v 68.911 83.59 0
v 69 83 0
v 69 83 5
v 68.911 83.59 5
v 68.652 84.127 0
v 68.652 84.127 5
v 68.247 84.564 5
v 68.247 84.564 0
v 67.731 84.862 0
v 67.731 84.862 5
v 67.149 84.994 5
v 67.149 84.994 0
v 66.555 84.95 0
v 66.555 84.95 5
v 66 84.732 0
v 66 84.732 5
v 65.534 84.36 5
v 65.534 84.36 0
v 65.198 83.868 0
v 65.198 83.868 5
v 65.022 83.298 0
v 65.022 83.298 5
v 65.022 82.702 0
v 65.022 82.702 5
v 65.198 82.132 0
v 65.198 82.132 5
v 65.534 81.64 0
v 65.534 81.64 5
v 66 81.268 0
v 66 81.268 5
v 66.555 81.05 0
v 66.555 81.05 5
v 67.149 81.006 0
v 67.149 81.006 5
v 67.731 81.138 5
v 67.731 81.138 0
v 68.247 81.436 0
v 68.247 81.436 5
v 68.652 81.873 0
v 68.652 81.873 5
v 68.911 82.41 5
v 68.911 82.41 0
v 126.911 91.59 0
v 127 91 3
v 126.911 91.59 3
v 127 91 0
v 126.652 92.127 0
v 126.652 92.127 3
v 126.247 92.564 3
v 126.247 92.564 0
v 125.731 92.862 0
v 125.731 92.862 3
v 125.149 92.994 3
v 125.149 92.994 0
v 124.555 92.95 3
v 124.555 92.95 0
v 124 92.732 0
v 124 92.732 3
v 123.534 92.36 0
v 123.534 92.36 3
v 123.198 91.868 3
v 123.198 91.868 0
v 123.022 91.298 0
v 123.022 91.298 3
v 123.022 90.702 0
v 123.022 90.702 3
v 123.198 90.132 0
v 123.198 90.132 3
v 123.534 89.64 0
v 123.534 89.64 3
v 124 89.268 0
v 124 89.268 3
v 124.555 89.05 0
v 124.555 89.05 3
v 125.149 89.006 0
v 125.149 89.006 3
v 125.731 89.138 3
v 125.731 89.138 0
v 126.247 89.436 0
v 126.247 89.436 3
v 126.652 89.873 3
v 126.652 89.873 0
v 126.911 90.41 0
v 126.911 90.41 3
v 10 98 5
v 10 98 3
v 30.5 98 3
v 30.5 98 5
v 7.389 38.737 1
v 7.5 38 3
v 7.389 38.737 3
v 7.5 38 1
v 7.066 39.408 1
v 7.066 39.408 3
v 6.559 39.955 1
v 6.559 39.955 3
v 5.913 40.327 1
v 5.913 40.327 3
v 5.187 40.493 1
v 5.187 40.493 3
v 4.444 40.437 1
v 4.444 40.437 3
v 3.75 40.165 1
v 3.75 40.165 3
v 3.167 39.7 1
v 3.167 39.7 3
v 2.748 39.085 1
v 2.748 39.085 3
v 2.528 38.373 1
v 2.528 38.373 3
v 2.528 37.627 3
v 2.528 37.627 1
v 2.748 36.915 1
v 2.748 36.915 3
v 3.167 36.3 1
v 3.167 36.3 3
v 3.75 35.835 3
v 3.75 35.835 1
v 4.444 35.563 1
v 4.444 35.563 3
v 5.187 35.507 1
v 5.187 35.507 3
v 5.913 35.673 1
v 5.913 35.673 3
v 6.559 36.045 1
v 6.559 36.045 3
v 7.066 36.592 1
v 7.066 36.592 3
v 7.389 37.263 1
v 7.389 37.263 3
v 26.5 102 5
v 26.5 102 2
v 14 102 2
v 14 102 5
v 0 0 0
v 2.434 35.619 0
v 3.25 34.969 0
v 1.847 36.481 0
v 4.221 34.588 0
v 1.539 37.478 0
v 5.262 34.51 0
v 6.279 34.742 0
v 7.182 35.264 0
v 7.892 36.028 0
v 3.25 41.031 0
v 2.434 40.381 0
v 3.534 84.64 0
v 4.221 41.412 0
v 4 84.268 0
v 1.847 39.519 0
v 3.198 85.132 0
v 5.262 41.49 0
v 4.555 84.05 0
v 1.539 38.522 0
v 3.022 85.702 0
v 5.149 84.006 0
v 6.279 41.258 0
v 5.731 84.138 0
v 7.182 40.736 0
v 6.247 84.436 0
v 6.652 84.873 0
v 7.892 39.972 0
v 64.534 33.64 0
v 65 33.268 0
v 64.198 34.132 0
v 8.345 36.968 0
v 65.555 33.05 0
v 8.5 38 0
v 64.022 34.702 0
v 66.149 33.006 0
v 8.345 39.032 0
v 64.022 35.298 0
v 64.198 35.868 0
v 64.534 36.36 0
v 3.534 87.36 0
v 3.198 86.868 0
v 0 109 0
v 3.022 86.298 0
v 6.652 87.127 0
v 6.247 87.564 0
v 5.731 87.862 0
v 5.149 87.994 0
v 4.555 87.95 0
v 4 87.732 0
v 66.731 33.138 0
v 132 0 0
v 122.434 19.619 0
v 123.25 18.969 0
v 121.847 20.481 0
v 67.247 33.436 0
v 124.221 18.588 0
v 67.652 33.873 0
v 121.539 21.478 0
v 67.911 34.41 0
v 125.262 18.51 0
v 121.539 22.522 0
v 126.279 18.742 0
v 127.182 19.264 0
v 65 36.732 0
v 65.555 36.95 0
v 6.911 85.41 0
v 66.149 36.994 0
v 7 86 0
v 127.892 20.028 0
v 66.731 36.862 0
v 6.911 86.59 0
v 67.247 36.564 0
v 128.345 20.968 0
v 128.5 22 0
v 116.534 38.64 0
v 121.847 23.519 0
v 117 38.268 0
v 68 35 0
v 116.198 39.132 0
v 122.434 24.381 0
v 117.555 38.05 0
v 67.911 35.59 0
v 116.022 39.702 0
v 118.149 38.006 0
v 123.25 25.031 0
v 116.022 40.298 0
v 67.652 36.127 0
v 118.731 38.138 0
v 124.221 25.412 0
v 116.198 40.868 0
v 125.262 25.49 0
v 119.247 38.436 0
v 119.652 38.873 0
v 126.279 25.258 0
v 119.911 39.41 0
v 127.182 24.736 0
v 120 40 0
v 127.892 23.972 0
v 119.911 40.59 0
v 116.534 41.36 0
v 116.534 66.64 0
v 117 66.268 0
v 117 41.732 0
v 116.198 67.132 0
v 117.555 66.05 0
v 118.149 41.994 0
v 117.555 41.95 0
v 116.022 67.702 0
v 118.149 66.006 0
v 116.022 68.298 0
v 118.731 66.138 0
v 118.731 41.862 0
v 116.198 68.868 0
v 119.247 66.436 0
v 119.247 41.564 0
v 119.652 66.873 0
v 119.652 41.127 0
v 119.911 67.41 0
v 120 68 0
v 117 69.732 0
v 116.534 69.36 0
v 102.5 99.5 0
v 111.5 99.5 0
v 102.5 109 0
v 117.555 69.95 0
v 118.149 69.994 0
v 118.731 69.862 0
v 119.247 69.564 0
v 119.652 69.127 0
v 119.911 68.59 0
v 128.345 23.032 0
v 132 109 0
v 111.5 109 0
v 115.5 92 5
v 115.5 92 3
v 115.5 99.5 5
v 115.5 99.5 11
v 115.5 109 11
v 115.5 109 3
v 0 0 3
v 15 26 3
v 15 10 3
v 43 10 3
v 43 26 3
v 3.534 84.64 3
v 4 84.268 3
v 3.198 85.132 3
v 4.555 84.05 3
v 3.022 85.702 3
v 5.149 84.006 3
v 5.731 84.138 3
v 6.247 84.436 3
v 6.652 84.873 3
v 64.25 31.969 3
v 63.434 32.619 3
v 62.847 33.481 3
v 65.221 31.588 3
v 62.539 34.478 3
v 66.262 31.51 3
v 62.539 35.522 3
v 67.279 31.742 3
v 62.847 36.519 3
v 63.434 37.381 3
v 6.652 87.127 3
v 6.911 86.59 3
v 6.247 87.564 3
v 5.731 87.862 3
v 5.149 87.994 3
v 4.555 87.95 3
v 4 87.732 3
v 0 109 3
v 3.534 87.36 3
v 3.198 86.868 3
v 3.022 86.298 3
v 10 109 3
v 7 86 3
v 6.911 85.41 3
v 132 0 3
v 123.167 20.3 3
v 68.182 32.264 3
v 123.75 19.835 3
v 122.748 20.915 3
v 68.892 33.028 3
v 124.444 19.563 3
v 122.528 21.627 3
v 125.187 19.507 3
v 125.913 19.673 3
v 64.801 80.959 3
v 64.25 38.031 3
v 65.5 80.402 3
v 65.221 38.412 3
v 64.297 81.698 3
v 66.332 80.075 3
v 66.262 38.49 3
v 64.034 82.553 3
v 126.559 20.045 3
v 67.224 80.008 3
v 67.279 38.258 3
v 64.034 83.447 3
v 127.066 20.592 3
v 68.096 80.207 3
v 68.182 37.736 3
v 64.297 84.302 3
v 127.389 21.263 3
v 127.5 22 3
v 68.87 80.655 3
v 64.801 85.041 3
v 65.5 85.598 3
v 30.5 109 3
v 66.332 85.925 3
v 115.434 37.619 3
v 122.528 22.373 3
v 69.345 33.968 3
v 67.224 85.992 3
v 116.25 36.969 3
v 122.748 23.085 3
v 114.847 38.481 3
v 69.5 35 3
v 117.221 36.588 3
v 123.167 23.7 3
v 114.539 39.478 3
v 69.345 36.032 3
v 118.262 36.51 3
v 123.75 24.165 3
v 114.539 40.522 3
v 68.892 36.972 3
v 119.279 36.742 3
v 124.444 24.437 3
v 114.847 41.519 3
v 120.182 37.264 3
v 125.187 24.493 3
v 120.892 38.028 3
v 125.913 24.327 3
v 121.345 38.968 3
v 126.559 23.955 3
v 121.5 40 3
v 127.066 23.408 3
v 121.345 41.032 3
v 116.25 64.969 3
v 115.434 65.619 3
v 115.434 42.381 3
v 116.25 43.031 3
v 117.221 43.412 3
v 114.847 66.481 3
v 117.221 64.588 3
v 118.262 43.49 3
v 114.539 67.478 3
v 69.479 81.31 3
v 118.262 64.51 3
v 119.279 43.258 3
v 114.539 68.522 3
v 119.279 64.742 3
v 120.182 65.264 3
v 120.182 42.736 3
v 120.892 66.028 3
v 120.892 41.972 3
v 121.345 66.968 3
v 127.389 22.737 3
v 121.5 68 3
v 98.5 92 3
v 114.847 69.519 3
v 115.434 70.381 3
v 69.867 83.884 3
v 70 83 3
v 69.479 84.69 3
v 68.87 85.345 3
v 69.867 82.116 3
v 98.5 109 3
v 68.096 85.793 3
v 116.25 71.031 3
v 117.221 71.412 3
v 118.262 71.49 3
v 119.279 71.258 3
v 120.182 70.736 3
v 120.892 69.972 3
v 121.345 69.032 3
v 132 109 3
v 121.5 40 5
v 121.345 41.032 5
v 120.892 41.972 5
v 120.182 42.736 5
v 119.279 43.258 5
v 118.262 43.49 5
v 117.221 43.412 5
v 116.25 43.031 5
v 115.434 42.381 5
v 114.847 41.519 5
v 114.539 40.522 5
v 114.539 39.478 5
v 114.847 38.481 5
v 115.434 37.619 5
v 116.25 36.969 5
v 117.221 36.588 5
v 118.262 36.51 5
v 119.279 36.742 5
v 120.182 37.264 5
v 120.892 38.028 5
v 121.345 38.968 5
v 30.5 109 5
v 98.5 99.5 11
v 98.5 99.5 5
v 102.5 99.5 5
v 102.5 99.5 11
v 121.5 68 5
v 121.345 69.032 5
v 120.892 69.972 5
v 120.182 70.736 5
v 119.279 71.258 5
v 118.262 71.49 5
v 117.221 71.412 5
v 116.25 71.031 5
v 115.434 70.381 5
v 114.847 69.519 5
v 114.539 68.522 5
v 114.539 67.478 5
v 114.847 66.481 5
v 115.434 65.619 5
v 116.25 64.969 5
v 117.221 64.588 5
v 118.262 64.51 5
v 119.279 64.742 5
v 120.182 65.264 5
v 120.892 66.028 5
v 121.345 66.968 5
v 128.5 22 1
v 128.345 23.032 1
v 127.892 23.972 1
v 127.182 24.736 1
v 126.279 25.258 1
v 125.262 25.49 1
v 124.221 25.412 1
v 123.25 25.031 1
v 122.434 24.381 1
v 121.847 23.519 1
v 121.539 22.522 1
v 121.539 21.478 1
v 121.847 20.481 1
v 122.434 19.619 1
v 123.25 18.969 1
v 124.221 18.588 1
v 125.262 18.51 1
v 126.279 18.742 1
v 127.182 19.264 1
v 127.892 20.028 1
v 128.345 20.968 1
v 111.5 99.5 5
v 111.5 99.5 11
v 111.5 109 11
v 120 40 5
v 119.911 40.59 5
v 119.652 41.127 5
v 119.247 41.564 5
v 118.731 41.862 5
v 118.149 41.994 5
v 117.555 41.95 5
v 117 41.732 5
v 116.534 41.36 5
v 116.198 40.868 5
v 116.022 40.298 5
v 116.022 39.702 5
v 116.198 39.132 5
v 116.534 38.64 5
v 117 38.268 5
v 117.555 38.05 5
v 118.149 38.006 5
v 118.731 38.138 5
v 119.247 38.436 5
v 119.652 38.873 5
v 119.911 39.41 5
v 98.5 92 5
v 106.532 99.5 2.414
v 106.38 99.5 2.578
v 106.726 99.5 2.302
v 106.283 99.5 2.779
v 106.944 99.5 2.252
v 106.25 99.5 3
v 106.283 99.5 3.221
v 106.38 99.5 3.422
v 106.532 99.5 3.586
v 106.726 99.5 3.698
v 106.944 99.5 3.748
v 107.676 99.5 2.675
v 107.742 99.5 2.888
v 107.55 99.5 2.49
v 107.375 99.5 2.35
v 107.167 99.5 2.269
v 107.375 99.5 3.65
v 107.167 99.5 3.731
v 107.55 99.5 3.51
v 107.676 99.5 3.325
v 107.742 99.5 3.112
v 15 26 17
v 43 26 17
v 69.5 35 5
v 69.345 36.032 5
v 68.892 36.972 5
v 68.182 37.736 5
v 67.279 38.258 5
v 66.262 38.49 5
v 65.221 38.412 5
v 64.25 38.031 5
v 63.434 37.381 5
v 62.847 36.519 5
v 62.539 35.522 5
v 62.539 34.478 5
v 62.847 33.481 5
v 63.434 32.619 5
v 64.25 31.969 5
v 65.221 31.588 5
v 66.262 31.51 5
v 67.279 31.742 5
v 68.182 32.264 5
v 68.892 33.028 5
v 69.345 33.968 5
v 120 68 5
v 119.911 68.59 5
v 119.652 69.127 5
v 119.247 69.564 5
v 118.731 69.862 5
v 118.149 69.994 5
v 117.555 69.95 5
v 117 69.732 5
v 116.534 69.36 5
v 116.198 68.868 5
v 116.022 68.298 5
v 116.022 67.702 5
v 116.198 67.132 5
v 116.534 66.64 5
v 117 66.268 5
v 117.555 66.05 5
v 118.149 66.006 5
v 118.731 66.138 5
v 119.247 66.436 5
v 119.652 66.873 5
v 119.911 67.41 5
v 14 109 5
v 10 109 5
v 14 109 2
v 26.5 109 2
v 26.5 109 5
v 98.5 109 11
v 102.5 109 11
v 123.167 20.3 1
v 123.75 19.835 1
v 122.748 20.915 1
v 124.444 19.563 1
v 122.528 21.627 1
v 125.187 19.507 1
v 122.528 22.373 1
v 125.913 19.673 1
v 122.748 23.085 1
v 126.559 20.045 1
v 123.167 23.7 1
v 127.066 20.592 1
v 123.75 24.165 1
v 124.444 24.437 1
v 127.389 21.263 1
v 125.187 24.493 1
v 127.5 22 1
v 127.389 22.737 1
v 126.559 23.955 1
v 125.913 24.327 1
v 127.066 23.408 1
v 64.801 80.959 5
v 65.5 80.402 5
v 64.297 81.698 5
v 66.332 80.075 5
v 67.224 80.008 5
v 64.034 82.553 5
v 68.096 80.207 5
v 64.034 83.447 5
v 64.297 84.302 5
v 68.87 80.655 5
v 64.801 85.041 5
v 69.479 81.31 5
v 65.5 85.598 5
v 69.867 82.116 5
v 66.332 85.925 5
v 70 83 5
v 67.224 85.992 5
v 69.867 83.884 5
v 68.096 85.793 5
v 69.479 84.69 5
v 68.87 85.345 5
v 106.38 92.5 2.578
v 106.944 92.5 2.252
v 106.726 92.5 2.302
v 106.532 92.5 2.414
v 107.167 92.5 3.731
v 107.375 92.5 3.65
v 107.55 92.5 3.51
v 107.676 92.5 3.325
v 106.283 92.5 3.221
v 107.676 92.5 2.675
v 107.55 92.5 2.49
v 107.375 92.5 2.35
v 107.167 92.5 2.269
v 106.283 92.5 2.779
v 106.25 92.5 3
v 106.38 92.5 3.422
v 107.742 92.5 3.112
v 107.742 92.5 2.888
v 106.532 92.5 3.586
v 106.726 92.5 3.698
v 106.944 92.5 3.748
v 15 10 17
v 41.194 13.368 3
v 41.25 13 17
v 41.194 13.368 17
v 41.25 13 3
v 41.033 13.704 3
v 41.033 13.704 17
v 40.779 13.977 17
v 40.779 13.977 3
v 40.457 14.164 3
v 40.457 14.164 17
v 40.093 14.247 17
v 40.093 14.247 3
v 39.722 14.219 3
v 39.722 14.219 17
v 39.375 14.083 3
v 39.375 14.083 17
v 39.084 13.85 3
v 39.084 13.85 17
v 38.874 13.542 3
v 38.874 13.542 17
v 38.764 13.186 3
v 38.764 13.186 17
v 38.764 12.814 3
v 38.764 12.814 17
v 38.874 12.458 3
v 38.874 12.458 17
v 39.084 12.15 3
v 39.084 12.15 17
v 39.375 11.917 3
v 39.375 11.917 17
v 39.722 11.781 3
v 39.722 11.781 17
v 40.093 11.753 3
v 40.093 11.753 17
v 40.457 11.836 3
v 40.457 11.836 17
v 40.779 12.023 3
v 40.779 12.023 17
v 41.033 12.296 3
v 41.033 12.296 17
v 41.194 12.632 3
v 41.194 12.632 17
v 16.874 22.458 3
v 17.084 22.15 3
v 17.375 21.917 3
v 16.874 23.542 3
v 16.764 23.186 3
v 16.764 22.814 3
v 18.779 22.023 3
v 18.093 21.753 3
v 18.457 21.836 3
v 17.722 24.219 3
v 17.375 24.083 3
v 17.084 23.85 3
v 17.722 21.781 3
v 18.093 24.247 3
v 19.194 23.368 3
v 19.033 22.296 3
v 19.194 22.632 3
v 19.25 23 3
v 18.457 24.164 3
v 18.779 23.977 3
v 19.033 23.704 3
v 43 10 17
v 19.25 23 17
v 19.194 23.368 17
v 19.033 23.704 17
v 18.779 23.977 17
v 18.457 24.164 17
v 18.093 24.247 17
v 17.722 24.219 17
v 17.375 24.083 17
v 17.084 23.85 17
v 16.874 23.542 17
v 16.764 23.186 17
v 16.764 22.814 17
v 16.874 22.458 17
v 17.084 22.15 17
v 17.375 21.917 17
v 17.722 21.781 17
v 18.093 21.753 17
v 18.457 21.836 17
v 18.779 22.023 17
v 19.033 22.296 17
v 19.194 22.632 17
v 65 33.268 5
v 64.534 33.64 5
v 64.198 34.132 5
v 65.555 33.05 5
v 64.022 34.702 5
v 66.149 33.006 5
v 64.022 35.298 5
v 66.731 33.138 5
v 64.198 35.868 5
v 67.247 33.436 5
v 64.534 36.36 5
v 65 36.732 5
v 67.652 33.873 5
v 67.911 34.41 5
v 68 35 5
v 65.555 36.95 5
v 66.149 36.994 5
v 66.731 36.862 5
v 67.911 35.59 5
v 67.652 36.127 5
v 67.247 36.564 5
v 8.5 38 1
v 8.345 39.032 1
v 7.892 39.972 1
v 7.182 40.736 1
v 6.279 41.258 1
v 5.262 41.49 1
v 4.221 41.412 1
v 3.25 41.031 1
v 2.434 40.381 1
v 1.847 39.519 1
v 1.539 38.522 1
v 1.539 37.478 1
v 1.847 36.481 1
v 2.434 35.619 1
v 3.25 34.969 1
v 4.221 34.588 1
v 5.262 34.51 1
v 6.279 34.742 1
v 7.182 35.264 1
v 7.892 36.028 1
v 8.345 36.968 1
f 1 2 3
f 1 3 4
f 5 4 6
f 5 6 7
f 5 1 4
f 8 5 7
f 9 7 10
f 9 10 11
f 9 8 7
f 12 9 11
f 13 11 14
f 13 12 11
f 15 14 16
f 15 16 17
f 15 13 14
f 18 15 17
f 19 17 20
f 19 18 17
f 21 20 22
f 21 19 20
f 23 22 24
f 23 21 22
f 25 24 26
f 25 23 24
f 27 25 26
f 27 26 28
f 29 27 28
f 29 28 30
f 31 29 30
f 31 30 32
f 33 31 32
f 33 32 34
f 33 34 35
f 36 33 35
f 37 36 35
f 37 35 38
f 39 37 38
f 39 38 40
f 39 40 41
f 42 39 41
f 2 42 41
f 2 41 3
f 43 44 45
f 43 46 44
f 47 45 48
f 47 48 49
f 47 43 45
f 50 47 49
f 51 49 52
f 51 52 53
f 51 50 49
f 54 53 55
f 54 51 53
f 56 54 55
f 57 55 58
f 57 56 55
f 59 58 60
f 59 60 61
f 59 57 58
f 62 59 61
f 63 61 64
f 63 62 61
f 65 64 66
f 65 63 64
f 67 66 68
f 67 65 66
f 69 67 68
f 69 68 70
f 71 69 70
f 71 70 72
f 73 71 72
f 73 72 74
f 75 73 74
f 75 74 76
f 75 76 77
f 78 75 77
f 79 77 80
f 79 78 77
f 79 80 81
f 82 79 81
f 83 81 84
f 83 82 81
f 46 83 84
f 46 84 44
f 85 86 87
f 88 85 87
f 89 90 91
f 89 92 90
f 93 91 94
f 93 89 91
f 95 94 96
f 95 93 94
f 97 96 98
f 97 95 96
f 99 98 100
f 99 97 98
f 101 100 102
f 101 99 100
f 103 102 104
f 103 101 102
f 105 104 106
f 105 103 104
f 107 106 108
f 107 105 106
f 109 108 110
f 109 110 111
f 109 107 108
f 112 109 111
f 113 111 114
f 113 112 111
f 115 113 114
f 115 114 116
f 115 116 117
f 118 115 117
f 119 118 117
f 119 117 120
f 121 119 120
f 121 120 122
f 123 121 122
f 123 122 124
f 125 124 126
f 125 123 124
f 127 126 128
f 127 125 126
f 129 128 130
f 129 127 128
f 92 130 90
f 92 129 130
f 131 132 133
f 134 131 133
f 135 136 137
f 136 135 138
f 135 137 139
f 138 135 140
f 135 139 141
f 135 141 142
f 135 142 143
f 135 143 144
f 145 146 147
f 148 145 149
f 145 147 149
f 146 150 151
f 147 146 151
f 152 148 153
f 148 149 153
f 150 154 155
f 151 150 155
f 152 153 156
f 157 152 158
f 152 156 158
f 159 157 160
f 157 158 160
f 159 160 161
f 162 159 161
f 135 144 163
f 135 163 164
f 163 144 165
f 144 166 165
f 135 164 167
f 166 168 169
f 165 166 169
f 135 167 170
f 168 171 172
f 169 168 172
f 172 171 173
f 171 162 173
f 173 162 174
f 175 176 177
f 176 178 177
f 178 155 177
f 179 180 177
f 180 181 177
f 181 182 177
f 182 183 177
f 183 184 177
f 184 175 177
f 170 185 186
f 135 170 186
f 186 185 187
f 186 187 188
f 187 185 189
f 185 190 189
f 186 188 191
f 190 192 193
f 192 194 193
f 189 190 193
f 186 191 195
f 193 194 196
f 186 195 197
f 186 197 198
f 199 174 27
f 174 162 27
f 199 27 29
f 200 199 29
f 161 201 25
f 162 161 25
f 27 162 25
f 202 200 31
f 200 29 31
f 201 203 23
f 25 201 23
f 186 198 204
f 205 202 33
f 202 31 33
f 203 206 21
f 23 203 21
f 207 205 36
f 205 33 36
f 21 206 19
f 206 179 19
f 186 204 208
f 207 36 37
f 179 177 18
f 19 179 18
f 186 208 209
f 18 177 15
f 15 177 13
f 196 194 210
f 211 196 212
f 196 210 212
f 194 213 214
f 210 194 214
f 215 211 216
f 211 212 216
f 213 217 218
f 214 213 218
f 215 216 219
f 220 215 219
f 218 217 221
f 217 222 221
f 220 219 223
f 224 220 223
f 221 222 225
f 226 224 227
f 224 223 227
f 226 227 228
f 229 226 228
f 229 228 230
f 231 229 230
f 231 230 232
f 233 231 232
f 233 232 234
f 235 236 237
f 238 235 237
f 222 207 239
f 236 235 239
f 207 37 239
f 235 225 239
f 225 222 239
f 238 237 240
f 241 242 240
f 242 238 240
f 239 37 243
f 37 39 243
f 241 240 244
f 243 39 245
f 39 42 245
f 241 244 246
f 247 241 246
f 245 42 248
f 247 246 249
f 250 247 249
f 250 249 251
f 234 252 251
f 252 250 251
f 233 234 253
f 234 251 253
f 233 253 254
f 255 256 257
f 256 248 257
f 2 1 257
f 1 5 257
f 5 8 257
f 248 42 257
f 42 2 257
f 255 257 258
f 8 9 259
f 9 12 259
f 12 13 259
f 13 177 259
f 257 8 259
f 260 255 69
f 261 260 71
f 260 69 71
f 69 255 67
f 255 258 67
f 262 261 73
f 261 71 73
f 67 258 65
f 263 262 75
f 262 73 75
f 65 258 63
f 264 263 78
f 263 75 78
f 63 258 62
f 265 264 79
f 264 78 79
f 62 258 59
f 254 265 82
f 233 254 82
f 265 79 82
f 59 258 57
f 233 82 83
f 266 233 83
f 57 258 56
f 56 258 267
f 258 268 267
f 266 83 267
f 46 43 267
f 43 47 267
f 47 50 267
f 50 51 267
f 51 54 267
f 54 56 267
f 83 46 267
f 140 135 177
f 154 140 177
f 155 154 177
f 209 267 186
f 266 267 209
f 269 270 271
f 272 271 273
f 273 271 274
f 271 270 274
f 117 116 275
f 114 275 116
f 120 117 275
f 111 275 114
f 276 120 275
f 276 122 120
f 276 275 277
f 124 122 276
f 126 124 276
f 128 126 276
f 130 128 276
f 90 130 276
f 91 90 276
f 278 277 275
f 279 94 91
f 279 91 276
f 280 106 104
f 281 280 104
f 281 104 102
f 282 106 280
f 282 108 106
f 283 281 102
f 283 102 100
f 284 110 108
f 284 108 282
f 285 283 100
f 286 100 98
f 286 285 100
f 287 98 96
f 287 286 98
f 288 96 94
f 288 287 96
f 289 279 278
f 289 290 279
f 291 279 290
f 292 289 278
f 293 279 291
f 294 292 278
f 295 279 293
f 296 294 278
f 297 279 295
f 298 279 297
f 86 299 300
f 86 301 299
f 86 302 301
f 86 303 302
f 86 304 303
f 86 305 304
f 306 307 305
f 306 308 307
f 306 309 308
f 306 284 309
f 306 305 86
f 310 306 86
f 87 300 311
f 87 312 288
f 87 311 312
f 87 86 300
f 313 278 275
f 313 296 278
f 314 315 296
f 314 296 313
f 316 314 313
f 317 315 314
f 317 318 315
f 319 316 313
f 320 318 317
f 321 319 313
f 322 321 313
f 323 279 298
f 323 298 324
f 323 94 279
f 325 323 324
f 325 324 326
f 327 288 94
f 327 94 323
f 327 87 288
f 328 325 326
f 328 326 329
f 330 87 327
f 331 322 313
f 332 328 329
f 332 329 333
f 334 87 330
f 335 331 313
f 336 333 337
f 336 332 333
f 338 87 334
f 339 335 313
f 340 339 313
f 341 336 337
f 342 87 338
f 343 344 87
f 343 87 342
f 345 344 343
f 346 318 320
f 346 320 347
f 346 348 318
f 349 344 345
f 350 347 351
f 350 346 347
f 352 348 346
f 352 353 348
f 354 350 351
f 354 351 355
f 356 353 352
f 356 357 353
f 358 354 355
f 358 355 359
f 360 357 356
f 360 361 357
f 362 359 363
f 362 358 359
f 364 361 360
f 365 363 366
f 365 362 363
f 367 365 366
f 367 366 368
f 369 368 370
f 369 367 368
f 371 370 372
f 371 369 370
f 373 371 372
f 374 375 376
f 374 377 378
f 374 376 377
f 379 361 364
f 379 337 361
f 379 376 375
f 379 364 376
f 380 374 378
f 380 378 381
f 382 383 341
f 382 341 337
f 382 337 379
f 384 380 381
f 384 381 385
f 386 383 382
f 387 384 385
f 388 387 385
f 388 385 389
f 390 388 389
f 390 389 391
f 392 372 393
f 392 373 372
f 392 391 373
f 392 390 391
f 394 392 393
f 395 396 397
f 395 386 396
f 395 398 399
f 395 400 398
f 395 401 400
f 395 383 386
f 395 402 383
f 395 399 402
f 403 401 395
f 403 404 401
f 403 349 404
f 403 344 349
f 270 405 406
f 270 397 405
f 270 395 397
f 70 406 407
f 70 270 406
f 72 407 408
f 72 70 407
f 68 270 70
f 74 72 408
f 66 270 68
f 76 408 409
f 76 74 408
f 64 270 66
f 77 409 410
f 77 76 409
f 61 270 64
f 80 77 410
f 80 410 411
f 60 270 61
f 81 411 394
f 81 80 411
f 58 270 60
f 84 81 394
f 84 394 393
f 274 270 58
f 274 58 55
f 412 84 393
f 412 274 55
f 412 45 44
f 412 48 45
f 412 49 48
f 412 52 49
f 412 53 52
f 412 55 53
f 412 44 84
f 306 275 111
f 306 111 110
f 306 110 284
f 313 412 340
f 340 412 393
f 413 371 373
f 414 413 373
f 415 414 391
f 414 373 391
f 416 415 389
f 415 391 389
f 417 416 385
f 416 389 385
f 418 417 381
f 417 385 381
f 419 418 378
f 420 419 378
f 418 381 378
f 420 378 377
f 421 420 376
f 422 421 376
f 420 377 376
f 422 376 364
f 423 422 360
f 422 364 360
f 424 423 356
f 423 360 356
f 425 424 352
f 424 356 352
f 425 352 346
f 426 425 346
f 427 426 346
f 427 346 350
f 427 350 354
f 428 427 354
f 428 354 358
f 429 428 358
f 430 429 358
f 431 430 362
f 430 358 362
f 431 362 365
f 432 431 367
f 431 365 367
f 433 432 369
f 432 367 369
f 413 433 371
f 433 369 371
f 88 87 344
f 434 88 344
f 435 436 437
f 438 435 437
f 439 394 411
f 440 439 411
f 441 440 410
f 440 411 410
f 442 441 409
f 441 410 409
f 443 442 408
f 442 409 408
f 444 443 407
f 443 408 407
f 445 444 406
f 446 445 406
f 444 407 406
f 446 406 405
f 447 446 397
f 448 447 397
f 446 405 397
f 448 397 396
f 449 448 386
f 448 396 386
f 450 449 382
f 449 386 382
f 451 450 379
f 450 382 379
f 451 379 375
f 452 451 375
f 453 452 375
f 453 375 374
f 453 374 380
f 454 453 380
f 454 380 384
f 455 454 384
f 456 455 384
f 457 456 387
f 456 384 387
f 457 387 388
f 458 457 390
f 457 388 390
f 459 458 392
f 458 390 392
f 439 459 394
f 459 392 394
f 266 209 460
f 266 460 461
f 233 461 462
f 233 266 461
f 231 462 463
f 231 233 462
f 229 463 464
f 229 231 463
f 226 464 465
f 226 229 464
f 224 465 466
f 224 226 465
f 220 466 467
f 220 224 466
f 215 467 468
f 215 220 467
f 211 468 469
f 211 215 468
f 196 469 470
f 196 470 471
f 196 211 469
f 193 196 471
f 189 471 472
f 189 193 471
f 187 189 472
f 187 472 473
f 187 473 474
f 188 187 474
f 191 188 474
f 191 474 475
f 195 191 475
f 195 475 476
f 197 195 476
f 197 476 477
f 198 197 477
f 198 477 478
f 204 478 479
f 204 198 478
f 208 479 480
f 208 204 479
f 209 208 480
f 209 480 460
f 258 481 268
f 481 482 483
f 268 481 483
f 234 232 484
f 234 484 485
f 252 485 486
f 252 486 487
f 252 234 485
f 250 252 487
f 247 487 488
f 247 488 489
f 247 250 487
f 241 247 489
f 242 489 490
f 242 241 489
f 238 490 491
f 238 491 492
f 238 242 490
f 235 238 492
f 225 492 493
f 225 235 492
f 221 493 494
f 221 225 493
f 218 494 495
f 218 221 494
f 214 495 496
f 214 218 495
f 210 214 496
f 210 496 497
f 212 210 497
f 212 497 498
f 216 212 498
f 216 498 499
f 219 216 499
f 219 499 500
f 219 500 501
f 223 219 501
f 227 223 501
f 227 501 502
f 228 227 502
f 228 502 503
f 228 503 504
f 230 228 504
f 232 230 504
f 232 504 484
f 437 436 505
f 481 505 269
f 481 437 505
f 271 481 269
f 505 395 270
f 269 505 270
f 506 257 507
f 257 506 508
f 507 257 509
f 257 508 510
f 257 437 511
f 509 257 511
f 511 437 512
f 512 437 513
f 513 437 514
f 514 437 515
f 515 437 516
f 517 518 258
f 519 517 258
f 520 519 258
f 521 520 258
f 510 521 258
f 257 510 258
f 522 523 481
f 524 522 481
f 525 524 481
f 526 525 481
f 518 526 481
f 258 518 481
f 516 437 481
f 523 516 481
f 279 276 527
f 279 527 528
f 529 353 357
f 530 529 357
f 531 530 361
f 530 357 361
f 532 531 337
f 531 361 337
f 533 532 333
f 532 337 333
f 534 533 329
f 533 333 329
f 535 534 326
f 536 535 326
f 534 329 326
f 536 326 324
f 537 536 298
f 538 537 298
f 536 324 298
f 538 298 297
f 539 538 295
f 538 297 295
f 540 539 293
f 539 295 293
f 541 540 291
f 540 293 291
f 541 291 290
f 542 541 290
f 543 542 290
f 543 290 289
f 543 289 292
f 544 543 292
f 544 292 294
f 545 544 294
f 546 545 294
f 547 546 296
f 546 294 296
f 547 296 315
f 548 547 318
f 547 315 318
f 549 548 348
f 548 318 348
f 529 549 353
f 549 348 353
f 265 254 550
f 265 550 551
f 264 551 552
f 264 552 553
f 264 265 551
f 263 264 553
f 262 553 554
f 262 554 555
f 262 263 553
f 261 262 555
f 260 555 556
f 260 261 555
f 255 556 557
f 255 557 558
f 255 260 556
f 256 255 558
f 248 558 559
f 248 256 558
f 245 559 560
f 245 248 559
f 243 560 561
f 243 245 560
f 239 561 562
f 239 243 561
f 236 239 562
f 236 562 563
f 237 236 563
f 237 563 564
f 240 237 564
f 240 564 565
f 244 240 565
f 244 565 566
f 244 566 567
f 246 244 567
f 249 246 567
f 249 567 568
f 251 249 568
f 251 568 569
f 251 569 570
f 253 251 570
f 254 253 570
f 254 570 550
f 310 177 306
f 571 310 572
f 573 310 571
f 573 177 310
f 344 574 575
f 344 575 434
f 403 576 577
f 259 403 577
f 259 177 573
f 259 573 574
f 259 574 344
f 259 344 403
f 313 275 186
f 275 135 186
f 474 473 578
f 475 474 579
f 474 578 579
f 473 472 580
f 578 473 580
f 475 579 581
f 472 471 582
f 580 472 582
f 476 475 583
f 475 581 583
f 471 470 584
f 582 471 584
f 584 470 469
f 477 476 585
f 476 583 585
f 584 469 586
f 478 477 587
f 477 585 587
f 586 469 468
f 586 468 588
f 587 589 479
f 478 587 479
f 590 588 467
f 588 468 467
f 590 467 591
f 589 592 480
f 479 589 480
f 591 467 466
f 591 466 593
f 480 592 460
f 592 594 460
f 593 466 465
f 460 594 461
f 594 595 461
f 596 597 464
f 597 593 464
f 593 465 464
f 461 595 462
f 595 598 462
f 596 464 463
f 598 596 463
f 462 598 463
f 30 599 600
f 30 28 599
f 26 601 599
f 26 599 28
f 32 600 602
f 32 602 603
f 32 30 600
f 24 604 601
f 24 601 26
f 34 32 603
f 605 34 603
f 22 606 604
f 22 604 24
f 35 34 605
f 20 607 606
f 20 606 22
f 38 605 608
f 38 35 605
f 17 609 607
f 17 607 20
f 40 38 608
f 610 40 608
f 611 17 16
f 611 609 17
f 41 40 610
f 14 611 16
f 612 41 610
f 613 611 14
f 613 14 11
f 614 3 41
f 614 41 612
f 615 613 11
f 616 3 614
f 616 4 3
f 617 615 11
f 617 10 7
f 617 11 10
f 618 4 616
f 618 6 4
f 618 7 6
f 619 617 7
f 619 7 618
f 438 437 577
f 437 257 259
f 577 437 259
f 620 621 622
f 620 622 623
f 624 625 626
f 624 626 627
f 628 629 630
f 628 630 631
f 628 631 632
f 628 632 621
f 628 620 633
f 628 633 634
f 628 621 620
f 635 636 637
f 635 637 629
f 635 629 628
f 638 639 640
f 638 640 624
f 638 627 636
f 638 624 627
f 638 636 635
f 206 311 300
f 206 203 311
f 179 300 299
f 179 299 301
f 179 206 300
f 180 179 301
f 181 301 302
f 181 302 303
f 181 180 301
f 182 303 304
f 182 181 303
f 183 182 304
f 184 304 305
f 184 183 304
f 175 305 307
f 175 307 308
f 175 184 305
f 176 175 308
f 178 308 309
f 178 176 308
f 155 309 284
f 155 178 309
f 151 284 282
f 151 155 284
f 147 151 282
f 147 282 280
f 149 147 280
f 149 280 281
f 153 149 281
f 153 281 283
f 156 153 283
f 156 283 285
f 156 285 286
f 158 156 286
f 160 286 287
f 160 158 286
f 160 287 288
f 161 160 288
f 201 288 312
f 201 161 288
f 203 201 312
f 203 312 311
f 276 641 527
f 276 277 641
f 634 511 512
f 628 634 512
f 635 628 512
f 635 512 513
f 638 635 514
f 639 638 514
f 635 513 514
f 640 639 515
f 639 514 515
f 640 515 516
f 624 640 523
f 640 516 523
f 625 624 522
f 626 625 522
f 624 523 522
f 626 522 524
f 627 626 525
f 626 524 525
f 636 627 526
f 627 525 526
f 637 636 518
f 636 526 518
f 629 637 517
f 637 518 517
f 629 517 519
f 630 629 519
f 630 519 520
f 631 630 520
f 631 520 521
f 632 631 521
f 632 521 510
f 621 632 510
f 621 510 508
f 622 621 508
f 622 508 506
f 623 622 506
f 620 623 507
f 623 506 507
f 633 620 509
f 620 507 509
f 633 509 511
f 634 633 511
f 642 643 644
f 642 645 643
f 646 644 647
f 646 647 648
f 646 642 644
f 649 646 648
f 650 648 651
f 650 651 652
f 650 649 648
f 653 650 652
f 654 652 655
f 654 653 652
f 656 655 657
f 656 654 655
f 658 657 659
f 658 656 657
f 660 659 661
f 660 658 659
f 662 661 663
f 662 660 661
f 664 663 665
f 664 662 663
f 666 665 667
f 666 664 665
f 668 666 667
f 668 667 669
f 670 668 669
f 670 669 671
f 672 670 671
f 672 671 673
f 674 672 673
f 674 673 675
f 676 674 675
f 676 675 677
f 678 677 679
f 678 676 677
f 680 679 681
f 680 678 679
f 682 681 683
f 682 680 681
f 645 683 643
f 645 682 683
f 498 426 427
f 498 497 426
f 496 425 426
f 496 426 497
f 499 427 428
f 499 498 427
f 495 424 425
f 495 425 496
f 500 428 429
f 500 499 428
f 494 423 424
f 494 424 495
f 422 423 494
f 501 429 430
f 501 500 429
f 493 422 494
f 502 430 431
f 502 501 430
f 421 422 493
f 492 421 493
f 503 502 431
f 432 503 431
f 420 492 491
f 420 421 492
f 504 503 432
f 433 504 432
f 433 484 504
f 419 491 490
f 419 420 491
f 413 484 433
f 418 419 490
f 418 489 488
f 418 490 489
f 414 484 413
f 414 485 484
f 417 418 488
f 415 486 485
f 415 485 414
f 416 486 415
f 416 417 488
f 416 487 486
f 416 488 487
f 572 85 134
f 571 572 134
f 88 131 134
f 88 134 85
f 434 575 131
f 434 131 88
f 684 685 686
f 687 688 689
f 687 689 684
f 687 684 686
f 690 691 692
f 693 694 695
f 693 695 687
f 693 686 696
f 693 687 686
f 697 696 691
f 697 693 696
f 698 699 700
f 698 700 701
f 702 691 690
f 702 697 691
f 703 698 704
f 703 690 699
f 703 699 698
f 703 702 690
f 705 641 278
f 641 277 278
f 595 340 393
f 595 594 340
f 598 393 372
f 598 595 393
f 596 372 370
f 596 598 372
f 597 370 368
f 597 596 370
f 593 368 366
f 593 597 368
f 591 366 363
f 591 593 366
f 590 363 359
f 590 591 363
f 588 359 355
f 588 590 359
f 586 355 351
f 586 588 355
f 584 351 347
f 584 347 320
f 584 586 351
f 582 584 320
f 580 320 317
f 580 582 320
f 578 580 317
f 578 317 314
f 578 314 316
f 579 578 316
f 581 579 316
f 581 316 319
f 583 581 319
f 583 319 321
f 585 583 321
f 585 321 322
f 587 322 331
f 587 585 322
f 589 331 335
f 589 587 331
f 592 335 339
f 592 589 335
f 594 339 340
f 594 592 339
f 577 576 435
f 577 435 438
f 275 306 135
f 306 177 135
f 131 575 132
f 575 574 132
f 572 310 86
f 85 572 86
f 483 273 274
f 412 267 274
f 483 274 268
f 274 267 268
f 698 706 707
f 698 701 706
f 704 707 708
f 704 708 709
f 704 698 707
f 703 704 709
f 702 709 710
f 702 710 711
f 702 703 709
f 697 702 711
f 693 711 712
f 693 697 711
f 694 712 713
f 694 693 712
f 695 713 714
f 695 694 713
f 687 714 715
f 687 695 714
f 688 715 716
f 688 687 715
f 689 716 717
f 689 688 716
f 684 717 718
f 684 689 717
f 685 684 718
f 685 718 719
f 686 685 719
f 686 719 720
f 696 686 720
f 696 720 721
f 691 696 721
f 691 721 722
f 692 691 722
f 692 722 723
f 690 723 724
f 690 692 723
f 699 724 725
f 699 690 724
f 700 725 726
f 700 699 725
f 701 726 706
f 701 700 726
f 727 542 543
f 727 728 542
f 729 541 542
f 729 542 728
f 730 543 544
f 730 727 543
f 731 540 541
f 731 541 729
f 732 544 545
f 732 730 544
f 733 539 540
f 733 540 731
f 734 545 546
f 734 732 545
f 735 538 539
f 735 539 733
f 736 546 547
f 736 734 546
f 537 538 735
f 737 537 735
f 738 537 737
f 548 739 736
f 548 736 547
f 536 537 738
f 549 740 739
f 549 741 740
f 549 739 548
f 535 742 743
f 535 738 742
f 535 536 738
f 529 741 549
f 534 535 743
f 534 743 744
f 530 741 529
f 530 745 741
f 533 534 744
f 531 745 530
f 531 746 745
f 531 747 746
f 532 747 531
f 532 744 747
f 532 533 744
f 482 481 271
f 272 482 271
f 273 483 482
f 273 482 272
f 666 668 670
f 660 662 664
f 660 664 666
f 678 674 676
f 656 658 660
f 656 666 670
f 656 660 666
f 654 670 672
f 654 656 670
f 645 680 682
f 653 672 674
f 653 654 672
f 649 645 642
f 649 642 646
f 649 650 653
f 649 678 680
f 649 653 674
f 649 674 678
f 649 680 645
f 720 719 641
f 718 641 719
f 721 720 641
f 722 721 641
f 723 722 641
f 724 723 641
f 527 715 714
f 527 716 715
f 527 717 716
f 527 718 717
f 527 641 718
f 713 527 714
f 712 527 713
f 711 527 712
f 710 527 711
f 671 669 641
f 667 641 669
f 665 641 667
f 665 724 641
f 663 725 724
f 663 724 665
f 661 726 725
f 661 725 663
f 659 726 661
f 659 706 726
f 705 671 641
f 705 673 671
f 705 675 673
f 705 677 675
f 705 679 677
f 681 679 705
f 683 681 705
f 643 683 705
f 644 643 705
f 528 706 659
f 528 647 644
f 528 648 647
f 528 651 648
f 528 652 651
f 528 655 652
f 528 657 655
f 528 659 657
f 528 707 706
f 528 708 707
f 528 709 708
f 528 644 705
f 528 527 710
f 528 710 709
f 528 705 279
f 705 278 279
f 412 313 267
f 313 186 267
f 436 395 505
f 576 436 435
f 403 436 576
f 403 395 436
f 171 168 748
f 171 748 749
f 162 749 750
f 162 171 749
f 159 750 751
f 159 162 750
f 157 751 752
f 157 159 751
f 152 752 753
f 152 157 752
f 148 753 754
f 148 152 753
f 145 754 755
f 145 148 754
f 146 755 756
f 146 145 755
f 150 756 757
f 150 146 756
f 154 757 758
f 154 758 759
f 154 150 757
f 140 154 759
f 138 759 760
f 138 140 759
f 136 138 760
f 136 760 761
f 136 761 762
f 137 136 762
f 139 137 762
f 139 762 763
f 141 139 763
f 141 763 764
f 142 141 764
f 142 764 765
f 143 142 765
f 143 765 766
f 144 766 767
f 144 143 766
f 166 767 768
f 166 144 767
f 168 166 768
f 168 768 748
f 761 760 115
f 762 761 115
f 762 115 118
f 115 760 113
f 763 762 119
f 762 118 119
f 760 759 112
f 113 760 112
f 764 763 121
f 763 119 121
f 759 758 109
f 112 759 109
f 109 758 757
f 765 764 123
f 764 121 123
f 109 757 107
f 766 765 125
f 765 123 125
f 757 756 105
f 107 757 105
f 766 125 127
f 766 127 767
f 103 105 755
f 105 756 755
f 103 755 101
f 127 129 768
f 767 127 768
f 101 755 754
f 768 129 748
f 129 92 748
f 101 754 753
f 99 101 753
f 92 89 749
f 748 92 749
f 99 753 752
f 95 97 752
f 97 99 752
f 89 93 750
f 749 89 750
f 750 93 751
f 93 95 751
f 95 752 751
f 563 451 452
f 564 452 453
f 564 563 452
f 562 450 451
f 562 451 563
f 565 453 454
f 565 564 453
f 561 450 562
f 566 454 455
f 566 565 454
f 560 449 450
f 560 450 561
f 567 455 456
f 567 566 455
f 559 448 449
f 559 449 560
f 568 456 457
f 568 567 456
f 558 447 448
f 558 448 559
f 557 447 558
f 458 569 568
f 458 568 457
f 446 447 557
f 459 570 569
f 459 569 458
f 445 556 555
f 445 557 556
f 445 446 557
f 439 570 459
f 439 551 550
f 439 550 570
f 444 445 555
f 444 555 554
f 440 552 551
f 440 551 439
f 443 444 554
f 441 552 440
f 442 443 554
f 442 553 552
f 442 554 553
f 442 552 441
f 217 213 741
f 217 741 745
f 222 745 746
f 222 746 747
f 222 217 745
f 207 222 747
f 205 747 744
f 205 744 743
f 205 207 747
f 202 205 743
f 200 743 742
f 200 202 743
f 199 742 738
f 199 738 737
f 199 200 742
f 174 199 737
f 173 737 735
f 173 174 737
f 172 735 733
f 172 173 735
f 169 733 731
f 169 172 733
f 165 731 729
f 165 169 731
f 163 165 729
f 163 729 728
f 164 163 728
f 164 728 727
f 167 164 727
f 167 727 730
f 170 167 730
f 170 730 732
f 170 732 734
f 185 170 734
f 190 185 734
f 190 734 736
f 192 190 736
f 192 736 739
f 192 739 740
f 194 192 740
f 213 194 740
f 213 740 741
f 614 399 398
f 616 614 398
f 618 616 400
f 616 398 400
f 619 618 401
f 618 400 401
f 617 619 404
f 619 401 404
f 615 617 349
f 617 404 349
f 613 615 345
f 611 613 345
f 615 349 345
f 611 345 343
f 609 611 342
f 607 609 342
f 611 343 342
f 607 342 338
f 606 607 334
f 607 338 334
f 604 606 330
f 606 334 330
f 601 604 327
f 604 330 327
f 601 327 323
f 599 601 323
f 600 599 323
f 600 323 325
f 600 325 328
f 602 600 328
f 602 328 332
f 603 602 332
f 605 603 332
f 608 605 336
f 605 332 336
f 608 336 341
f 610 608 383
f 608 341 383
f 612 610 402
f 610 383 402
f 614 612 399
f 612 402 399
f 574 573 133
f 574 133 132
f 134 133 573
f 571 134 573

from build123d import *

# Parameters (mm, degrees)
F0_W      = 132
F0_H      = 109
F0_R      = 3.5
F0_R_2    = 2
F1_DEPTH  = 1
F2_W      = 132
F2_H      = 109
F2_R      = 3.5
F2_R_2    = 2
F2_R_3    = 2.5
F3_DEPTH  = 1
F4_R      = 2.5
F4_R_2    = 2
F5_DEPTH  = 1
F6_W      = 9
F6_H      = 9.5
F7_DEPTH  = 3
F8_R      = 3
F8_R_2    = 2
F8_R_3    = 3.5
F8_W      = 28
F8_H      = 16
F8_R_4    = 1.25
F9_DEPTH  = 2
F10_W     = 4
F10_H     = 9.5
F9_FACE_W = 28
F9_FACE_H = 16
F9_FACE_R = 1.25
F11_DEPTH = 6
F12_R     = 0.75
F13_DEPTH = 7
F14_W     = 28
F14_H     = 16
F14_R     = 1.25
F15_DEPTH = 6


# Not quite as in the source:
# - a feature names something its author has since deleted; it is built from what else it names


with BuildPart() as f1:
    # F0 (on Top) → F1 (new body)
    with BuildSketch(Plane.XY):
        with Locations((66, 54.5)):
            Rectangle(F0_W, F0_H)
        with Locations((5, 38)):
            Circle(F0_R, mode=Mode.SUBTRACT)
        with Locations((125, 22)):
            Circle(F0_R, mode=Mode.SUBTRACT)
        with Locations((66, 35)):
            Circle(F0_R_2, mode=Mode.SUBTRACT)
        with Locations((118, 40)):
            Circle(F0_R_2, mode=Mode.SUBTRACT)
        with Locations((5, 86)):
            Circle(F0_R_2, mode=Mode.SUBTRACT)
        with Locations((118, 68)):
            Circle(F0_R_2, mode=Mode.SUBTRACT)
        with Locations((67, 83)):
            Circle(F0_R_2, mode=Mode.SUBTRACT)
        with Locations((125, 91)):
            Circle(F0_R_2, mode=Mode.SUBTRACT)
    extrude(amount=F1_DEPTH)

    # F2 (on face) → F3 (join)
    with BuildSketch(Plane.XY.offset(1)):
        with Locations((66, 54.5)):
            Rectangle(F2_W, F2_H)
        with Locations((5, 38)):
            Circle(F2_R, mode=Mode.SUBTRACT)
        with Locations((125, 22)):
            Circle(F2_R, mode=Mode.SUBTRACT)
        with Locations((66, 35)):
            Circle(F2_R_2, mode=Mode.SUBTRACT)
        with Locations((118, 40)):
            Circle(F2_R_2, mode=Mode.SUBTRACT)
        with Locations((5, 86)):
            Circle(F2_R_2, mode=Mode.SUBTRACT)
        with Locations((118, 68)):
            Circle(F2_R_2, mode=Mode.SUBTRACT)
        with Locations((67, 83)):
            Circle(F2_R_2, mode=Mode.SUBTRACT)
        with Locations((125, 91)):
            Circle(F2_R_2, mode=Mode.SUBTRACT)
        with Locations((125, 22)):
            Circle(F2_R)
        with Locations((125, 22)):
            Circle(F2_R_3, mode=Mode.SUBTRACT)
        with Locations((5, 38)):
            Circle(F2_R)
        with Locations((5, 38)):
            Circle(F2_R_3, mode=Mode.SUBTRACT)
    extrude(amount=F3_DEPTH)

    # F4 (on face) → F5 (join)
    with BuildSketch(Plane.XY.offset(2)):
        Polygon((14, 102), (14, 109), (0, 109), (0, 0), (132, 0), (132, 109), (26.5, 109), (26.5, 102), align=None)
        with Locations((5, 38)):
            Circle(F4_R, mode=Mode.SUBTRACT)
        with Locations((125, 22)):
            Circle(F4_R, mode=Mode.SUBTRACT)
        with Locations((66, 35)):
            Circle(F4_R_2, mode=Mode.SUBTRACT)
        with Locations((118, 40)):
            Circle(F4_R_2, mode=Mode.SUBTRACT)
        with Locations((5, 86)):
            Circle(F4_R_2, mode=Mode.SUBTRACT)
        with Locations((118, 68)):
            Circle(F4_R_2, mode=Mode.SUBTRACT)
        with Locations((67, 83)):
            Circle(F4_R_2, mode=Mode.SUBTRACT)
        with Locations((125, 91)):
            Circle(F4_R_2, mode=Mode.SUBTRACT)
    extrude(amount=F5_DEPTH)

    # F6 (on face) → F7 (cut)
    with BuildSketch(Plane.XY.offset(3)):
        with Locations((107, 104.25)):
            Rectangle(F6_W, F6_H)
    extrude(amount=-F7_DEPTH, mode=Mode.SUBTRACT)

    # F8 (on face) → F9 (join)
    with BuildSketch(Plane.XY.offset(3)):
        Polygon((14, 102), (14, 109), (10, 109), (10, 98), (30.5, 98), (30.5, 109), (26.5, 109), (26.5, 102), align=None)
        Polygon((102.5, 109), (98.5, 109), (98.5, 92), (115.5, 92), (115.5, 109), (111.5, 109), (111.5, 99.5), (102.5, 99.5), align=None)
        with Locations((67, 83)):
            Circle(F8_R)
        with Locations((67, 83)):
            Circle(F8_R_2, mode=Mode.SUBTRACT)
        with Locations((66, 35)):
            Circle(F8_R_3)
        with Locations((66, 35)):
            Circle(F8_R_2, mode=Mode.SUBTRACT)
        with Locations((118, 68)):
            Circle(F8_R_3)
        with Locations((118, 68)):
            Circle(F8_R_2, mode=Mode.SUBTRACT)
        with Locations((118, 40)):
            Circle(F8_R_3)
        with Locations((118, 40)):
            Circle(F8_R_2, mode=Mode.SUBTRACT)
        with Locations((29, 18)):
            Rectangle(F8_W, F8_H)
        with Locations((18, 23)):
            Circle(F8_R_4, mode=Mode.SUBTRACT)
        with Locations((40, 13)):
            Circle(F8_R_4, mode=Mode.SUBTRACT)
    extrude(amount=F9_DEPTH)

    # F10 (on face) + F9_face (on face) → F11 (join)
    with BuildSketch(Plane.XY.offset(5)):
        with Locations((100.5, 104.25)):
            Rectangle(F10_W, F10_H)
        with Locations((113.5, 104.25)):
            Rectangle(F10_W, F10_H)
    with BuildSketch(Plane(origin=(67, 83, 5), x_dir=(1, 0, 0), z_dir=(0, 0, 1))):
        with Locations((-38, -65)):
            Rectangle(F9_FACE_W, F9_FACE_H)
        with Locations((-49, -60)):
            Circle(F9_FACE_R, mode=Mode.SUBTRACT)
        with Locations((-27, -70)):
            Circle(F9_FACE_R, mode=Mode.SUBTRACT)
    extrude(amount=F11_DEPTH)

    # F12 (on face) → F13 (cut)
    with BuildSketch(Plane(origin=(0, 99.5, 0), x_dir=(-1, 0, 0), z_dir=(0, 1, 0))):
        with Locations((-107, 3)):
            Circle(F12_R)
    extrude(amount=-F13_DEPTH, mode=Mode.SUBTRACT)

    # F14 (on face) → F15 (join)
    with BuildSketch(Plane.XY.offset(11)):
        with Locations((29, 18)):
            Rectangle(F14_W, F14_H)
        with Locations((40, 13)):
            Circle(F14_R, mode=Mode.SUBTRACT)
        with Locations((18, 23)):
            Circle(F14_R, mode=Mode.SUBTRACT)
    extrude(amount=F15_DEPTH)


solid = f1.part
